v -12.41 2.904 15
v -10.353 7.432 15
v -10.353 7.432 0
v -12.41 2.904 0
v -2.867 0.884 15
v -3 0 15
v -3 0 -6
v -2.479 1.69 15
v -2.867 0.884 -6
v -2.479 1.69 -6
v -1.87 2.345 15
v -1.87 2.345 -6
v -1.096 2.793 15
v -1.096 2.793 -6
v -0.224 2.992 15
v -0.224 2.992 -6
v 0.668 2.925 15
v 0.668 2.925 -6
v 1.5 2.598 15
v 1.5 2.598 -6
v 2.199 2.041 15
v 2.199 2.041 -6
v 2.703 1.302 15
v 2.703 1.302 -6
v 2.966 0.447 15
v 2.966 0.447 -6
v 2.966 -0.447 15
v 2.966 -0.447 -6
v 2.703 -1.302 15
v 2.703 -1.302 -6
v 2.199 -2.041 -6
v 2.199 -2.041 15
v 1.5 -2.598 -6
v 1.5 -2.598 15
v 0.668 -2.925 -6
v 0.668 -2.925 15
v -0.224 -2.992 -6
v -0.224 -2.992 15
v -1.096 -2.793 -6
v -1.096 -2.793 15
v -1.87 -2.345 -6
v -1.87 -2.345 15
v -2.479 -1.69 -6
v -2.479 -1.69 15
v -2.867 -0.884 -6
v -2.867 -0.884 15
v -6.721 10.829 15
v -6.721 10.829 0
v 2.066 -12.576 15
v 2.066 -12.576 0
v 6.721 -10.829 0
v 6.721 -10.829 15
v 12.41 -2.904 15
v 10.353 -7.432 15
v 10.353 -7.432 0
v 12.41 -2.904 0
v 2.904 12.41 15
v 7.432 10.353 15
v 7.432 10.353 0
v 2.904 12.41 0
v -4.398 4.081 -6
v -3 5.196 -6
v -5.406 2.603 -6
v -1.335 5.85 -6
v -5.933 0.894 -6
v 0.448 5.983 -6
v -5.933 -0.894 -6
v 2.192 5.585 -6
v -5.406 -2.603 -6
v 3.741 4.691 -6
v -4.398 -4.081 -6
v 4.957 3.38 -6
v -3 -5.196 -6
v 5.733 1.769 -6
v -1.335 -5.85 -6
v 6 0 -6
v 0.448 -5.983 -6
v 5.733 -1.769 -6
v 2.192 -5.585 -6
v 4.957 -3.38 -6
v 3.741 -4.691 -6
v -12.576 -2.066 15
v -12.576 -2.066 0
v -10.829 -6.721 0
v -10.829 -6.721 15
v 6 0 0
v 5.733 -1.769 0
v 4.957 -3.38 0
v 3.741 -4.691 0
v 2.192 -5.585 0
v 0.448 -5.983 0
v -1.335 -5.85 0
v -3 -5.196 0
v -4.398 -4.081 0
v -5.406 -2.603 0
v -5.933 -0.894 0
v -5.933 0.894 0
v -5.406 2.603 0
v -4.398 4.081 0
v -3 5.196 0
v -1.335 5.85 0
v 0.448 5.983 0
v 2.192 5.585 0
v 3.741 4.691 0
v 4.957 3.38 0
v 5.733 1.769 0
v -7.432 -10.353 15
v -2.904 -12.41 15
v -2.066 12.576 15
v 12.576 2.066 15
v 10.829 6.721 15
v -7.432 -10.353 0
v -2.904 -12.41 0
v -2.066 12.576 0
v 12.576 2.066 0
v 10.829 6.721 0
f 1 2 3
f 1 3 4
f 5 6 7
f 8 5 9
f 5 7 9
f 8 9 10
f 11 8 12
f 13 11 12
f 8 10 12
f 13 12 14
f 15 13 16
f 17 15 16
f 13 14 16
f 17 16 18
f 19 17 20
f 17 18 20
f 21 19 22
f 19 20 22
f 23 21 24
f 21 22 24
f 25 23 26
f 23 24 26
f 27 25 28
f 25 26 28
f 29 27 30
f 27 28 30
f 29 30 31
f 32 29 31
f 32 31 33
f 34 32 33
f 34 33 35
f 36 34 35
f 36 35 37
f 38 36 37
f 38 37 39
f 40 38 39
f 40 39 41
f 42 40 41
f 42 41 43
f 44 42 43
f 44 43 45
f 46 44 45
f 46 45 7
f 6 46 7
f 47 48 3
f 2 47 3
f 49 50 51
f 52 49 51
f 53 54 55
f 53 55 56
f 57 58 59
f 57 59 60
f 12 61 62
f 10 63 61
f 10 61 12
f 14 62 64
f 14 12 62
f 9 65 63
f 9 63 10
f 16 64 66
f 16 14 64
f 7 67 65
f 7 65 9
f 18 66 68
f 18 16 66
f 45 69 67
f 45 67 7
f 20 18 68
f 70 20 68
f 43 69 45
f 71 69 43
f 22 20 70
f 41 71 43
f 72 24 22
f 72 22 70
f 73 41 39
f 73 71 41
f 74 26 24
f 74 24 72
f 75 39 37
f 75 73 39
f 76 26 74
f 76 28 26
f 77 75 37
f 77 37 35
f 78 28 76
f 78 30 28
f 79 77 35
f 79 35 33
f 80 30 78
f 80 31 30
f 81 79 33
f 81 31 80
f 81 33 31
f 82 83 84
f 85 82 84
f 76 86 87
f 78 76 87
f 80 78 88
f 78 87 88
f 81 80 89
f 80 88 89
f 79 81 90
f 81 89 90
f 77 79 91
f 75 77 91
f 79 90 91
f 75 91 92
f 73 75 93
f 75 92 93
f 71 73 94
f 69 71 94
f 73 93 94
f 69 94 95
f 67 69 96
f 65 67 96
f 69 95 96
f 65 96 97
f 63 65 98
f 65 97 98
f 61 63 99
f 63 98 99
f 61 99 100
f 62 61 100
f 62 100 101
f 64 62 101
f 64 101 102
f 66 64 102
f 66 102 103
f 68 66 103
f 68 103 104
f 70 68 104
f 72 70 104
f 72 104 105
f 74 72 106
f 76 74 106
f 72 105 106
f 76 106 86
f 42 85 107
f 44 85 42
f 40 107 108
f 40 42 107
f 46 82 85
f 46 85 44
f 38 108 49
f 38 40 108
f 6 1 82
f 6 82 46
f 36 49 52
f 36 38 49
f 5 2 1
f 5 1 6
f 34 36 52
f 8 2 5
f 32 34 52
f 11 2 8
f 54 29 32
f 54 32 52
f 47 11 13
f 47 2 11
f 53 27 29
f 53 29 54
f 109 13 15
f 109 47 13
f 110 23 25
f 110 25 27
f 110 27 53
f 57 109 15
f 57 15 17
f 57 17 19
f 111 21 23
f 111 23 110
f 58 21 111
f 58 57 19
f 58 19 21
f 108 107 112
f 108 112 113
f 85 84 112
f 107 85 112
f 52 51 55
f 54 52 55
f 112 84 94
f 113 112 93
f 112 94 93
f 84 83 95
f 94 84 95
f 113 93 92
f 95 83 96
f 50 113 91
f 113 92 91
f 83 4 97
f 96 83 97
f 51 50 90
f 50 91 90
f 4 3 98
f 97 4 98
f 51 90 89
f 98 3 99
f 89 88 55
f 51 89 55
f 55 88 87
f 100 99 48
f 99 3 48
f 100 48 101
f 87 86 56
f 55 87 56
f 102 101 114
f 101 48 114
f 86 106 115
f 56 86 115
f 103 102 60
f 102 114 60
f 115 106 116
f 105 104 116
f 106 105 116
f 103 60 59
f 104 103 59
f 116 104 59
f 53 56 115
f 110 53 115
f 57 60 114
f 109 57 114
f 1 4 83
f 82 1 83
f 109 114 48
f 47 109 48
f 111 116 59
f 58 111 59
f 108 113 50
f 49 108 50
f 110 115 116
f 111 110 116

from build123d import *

# Parameters (mm, degrees)
EXTRUDE_1_DEPTH     = 15
SKETCH_2_R          = 6
EXTRUDE_2_DEPTH     = 6
SKETCH_3_R          = 3
CUT_EXTRUDE_1_DEPTH = 28.519640546


with BuildPart() as part:
    # Эскиз1 → Бобышка-Вытянуть1 (new body)
    with BuildSketch(Plane.XY):
        Polygon((10.828570014, 6.721181388), (7.432209439, 10.353476259), (2.90436235, 12.409548224), (-2.065647578, 12.576378965), (-6.721181388, 10.828570014), (-10.353476259, 7.432209439), (-12.409548224, 2.90436235), (-12.576378965, -2.065647578), (-10.828570014, -6.721181388), (-7.432209439, -10.353476259), (-2.90436235, -12.409548224), (2.065647578, -12.576378965), (6.721181388, -10.828570014), (10.353476259, -7.432209439), (12.409548224, -2.90436235), (12.576378965, 2.065647578), align=None)
    extrude(amount=EXTRUDE_1_DEPTH)

    # Эскиз2 → Бобышка-Вытянуть2 (add)
    with BuildSketch(Plane(origin=(0, 0, 0), x_dir=(-1, 0, 0), z_dir=(0, 0, -1))):
        with Locations(Location((0, 0, 0), (0, 0, 180))):
            Circle(SKETCH_2_R)
    extrude(amount=EXTRUDE_2_DEPTH)

    # Эскиз3 → Вырез-Вытянуть1 (cut, through all)
    with BuildSketch(Plane(origin=(0, 0, -6), x_dir=(-1, 0, 0), z_dir=(0, 0, -1))):
        Circle(SKETCH_3_R)
    extrude(amount=-CUT_EXTRUDE_1_DEPTH, mode=Mode.SUBTRACT)


solid = part.part
